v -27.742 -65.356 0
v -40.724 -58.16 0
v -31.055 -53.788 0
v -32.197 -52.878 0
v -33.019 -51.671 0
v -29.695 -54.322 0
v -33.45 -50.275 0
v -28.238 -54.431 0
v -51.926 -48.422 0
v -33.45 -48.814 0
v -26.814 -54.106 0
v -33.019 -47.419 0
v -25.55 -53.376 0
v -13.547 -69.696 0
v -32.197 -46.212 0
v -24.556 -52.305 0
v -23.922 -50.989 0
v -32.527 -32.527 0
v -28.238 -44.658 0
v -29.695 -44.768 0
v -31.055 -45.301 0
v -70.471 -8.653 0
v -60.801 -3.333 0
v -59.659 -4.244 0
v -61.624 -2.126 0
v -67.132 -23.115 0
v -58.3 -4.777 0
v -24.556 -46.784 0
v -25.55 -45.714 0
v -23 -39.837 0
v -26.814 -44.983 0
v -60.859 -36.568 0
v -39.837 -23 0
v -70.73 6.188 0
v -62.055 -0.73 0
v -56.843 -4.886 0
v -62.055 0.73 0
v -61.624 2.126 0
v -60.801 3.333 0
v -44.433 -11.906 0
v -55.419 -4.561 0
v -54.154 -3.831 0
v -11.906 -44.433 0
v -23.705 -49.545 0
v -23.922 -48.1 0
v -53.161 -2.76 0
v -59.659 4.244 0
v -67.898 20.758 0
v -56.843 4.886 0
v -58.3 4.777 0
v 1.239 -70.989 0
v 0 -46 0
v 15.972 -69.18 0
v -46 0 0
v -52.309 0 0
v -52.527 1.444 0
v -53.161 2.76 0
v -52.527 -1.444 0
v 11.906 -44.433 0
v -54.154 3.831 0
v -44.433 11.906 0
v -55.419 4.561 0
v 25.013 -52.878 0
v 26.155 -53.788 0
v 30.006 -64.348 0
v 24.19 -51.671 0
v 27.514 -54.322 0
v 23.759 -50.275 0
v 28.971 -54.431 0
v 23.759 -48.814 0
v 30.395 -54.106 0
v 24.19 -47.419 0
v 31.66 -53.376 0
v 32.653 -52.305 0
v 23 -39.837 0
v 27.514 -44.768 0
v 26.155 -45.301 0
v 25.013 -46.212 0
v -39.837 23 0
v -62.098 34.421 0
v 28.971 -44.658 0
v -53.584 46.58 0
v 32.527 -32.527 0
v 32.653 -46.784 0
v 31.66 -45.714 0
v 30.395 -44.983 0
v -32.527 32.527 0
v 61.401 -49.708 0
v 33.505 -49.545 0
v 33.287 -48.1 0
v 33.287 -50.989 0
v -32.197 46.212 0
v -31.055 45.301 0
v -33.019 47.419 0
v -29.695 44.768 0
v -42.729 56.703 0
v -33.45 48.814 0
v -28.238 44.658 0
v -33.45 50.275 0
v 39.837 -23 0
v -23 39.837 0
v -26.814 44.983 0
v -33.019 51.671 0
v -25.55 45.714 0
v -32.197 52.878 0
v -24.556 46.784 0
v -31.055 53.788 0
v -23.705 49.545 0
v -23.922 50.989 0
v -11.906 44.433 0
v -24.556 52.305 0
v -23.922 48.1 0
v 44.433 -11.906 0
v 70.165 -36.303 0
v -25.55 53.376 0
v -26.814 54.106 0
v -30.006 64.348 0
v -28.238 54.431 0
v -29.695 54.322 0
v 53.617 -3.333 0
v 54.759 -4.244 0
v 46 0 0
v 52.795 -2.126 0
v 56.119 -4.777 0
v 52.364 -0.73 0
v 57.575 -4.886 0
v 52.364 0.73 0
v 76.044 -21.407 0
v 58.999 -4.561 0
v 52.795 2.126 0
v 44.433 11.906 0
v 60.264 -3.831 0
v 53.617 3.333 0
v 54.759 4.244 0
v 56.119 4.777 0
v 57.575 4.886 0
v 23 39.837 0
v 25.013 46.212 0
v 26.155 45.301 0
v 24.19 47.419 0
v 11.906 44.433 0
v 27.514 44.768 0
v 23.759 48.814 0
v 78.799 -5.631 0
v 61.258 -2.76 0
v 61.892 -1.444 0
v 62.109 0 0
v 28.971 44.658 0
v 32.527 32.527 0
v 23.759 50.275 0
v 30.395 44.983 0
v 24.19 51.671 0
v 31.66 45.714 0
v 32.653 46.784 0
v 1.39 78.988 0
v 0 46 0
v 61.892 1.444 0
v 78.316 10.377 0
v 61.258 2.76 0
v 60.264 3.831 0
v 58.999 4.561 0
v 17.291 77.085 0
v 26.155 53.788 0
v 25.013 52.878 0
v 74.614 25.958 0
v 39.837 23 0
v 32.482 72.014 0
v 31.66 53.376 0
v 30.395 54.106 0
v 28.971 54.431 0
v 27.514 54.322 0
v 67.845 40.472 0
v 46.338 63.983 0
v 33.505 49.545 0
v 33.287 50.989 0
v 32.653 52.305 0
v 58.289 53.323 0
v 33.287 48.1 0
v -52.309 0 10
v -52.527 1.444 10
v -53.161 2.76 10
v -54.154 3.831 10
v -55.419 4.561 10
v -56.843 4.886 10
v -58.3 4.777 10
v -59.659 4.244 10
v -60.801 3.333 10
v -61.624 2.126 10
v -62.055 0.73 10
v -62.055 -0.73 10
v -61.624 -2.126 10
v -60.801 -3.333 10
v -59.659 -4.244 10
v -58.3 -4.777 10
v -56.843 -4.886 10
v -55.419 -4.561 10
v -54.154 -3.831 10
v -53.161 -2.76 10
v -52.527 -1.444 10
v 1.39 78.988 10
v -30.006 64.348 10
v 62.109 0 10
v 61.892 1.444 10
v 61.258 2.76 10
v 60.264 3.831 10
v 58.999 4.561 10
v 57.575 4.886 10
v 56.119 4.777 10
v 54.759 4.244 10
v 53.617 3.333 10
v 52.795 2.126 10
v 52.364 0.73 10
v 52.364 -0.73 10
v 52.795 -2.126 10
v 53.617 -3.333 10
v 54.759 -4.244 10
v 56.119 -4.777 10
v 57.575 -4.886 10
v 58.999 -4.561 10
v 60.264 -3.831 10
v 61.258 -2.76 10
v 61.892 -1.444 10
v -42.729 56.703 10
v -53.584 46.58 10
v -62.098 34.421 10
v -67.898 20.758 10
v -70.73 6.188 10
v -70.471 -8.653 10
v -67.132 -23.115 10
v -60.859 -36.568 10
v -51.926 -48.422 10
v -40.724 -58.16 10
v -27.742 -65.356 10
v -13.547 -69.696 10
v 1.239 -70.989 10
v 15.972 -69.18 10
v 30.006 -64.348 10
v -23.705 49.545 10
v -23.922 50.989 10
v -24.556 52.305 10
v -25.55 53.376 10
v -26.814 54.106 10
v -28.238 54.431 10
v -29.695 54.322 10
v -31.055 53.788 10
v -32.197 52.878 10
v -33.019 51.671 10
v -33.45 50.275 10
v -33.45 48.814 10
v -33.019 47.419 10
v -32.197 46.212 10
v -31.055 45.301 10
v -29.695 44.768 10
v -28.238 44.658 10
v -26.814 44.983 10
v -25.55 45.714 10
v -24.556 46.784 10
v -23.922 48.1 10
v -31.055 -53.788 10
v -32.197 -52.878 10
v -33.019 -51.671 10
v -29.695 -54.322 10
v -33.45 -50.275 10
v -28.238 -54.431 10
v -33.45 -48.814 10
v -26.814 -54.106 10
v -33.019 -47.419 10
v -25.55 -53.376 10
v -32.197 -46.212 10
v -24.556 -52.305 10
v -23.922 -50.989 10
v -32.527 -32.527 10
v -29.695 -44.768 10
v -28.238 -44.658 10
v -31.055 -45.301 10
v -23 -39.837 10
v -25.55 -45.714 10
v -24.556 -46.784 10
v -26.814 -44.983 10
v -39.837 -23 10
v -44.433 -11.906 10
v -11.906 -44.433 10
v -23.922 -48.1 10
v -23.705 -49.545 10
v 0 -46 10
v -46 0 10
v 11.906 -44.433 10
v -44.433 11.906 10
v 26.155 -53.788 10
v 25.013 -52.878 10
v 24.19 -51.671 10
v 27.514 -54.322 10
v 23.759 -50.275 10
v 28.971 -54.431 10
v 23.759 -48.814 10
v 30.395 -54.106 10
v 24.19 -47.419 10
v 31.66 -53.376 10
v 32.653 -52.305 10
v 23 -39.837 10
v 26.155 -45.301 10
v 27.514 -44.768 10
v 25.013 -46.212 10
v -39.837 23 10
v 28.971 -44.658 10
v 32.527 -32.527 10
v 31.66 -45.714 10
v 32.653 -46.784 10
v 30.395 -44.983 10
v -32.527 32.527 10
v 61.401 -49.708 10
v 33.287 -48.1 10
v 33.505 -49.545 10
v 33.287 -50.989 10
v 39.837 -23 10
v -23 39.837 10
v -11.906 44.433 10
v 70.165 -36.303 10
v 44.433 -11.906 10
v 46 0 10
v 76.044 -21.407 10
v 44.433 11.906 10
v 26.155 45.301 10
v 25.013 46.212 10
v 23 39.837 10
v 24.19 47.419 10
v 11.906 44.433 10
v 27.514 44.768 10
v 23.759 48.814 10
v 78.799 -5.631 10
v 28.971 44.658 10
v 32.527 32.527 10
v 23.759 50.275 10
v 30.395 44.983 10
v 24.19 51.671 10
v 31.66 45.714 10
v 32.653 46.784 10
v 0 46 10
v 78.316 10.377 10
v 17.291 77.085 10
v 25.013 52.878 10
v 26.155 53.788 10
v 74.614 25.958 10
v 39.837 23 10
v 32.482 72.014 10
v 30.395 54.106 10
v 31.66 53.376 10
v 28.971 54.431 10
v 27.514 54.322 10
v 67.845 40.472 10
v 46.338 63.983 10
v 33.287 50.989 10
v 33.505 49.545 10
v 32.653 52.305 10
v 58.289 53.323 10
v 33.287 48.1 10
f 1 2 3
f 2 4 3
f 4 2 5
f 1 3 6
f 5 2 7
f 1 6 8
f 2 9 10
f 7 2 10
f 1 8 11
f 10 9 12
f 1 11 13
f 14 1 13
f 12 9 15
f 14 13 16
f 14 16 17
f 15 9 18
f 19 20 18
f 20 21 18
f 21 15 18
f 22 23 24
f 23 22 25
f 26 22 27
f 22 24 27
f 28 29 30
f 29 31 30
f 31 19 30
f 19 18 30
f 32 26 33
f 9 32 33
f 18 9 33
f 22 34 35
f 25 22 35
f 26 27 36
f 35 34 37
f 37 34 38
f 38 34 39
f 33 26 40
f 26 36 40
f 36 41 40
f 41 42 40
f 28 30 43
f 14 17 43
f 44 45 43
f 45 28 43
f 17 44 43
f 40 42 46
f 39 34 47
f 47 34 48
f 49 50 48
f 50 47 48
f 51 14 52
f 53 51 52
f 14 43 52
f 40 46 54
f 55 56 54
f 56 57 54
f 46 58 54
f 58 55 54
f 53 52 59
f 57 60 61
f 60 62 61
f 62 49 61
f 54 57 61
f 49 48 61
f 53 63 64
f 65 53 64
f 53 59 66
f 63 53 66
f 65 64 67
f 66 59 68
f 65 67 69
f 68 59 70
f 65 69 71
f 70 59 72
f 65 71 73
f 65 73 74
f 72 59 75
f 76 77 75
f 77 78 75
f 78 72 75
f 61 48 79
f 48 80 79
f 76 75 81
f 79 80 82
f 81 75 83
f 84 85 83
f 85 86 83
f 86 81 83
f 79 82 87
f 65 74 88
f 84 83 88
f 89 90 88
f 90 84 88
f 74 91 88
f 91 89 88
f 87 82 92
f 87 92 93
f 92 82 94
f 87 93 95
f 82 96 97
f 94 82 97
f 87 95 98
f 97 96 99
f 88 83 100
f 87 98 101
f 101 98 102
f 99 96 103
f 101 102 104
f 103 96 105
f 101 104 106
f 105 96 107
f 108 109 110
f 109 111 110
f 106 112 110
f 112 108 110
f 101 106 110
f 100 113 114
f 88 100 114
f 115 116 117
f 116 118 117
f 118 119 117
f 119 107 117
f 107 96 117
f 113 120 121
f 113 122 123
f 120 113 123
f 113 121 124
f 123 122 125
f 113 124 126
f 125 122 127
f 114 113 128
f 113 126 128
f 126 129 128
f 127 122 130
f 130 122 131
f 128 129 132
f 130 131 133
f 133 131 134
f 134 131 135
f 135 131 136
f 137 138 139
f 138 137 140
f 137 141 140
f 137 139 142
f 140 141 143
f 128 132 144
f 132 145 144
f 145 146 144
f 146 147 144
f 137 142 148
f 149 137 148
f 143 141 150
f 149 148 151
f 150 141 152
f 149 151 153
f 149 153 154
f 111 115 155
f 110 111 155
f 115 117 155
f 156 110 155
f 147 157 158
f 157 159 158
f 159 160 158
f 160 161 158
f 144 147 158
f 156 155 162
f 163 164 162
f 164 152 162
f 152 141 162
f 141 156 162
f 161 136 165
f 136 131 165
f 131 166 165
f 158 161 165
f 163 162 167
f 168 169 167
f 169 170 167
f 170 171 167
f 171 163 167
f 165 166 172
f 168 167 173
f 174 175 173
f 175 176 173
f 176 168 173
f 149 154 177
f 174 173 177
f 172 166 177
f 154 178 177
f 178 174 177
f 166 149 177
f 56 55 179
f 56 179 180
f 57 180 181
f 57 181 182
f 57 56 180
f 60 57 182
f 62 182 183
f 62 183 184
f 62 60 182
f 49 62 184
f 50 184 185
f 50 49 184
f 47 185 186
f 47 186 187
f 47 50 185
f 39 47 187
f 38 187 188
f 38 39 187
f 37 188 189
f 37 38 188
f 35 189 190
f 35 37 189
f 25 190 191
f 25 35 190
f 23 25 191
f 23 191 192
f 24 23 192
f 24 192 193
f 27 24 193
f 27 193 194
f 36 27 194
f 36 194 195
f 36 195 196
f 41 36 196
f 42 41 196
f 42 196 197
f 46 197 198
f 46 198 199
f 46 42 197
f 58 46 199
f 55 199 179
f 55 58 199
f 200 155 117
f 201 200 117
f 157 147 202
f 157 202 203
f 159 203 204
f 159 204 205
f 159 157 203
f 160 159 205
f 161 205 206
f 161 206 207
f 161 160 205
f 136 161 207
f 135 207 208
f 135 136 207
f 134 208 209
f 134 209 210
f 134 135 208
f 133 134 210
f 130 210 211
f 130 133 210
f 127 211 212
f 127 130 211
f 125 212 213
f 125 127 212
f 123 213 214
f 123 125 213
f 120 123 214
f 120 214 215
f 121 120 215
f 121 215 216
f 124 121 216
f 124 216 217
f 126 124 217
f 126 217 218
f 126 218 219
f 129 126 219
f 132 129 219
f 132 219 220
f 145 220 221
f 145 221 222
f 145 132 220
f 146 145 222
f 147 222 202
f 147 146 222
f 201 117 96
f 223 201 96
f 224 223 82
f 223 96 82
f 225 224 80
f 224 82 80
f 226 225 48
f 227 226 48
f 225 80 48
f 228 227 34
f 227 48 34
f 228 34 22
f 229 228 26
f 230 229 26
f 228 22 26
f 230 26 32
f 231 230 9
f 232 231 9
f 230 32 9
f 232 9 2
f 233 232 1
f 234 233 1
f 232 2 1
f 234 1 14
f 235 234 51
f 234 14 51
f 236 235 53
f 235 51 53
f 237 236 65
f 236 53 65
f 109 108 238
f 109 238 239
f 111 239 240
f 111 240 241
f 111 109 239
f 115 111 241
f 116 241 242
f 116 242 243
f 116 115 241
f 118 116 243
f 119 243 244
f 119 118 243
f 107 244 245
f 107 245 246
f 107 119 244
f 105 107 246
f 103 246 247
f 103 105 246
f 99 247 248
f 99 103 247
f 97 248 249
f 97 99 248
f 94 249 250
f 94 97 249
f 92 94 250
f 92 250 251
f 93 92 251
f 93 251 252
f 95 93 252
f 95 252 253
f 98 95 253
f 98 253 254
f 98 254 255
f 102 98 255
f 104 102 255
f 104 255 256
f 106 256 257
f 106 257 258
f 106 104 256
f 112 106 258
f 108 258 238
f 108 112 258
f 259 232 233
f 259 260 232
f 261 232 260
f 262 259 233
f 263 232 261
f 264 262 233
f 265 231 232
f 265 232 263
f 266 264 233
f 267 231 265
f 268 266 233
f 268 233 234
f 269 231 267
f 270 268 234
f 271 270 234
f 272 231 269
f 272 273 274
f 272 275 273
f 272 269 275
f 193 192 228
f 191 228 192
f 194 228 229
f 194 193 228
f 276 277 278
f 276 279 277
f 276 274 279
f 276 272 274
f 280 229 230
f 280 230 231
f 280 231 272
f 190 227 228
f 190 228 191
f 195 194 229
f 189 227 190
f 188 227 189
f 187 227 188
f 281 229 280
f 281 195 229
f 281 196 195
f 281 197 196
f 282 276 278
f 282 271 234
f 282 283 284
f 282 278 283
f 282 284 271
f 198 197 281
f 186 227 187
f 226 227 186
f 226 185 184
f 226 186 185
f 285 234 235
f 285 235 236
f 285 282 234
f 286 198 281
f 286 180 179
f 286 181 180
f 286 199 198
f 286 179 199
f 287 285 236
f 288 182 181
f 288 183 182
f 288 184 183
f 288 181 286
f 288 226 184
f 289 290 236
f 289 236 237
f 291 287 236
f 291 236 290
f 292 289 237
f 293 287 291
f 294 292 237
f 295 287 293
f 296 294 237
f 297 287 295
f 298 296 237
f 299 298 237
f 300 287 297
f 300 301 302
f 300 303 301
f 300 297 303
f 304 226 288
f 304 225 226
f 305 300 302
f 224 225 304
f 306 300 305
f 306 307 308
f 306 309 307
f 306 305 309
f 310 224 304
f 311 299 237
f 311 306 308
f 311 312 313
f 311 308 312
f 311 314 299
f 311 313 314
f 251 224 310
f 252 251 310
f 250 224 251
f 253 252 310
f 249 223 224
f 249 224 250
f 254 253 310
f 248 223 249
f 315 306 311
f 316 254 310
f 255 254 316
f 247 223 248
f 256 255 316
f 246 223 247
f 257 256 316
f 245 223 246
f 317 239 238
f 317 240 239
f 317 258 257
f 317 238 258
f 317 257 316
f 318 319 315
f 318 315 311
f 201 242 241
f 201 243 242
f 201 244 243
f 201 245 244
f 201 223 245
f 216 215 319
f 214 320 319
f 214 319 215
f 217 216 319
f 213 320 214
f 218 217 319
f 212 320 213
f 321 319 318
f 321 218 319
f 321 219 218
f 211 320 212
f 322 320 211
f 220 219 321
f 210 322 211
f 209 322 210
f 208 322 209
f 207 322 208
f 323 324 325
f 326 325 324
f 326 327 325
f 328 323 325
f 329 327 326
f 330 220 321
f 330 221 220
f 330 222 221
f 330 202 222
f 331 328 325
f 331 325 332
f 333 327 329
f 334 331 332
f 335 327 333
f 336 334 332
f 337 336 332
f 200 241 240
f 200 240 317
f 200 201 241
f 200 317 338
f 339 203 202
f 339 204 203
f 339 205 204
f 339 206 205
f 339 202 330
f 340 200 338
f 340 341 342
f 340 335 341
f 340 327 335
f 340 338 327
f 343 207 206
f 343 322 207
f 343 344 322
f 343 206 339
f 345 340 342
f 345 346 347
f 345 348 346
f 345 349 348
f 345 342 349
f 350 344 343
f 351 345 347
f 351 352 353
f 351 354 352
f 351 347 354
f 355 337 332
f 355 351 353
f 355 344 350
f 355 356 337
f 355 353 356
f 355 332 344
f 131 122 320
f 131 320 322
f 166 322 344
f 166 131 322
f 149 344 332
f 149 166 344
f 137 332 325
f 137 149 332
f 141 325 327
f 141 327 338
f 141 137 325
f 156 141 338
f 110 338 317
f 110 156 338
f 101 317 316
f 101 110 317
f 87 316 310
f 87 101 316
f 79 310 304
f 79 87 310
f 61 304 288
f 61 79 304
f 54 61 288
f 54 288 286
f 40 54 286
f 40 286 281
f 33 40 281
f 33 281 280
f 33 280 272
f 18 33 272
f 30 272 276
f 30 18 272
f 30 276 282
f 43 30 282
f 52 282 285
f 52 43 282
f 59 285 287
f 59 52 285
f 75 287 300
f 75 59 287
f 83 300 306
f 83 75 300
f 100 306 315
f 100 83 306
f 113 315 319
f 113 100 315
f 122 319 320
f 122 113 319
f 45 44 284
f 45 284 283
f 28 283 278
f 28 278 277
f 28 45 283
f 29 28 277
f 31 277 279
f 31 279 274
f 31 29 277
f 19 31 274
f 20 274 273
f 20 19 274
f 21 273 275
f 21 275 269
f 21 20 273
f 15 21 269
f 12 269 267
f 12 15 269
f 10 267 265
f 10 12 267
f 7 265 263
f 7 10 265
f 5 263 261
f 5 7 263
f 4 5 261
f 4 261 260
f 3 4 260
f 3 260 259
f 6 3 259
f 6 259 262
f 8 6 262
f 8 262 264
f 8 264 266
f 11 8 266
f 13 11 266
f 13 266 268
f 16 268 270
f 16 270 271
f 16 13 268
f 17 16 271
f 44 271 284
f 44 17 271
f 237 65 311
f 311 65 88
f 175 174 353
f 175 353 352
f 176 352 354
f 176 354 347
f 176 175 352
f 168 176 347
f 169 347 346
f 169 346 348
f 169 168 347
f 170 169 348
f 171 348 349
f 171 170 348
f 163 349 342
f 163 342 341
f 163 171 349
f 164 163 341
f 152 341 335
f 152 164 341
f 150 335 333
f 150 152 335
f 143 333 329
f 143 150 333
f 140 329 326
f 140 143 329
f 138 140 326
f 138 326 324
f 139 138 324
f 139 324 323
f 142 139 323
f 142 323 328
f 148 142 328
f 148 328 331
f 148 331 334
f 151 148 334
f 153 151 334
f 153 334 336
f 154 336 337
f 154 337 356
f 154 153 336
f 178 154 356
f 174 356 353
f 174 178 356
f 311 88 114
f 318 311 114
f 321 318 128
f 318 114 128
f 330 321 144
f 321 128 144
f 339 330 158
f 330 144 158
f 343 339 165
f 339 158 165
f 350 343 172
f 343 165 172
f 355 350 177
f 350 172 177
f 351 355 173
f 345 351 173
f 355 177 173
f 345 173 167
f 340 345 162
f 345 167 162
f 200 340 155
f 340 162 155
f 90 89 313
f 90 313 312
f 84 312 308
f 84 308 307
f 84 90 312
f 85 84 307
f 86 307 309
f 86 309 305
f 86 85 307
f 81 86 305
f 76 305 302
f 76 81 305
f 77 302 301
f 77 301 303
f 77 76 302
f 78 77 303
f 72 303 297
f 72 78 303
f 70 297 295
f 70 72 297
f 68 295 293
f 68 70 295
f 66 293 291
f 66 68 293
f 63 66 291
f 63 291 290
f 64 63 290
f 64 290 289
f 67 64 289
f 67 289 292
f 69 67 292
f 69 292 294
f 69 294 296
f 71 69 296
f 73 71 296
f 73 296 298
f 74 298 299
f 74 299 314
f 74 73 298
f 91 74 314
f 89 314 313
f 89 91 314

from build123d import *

# Parameters (mm, degrees)
F0_R     = 4.9
F0_R_2   = 46
F1_DEPTH = 10


with BuildPart() as f1:
    # F0 (on Top) → F1 (new body)
    with BuildSketch(Plane.XY):
        with BuildLine():
            Line((1.389526, 78.987779), (-30.005897, 64.347853))
            ThreePointArc((-30.005897, 64.347853), (-64.347853, -30.005897), (30.005897, -64.347853))
            Line((30.005897, -64.347853), (61.401319, -49.707927))
            ThreePointArc((61.401319, -49.707927), (71.598315, 33.386843), (1.389526, 78.987779))
        make_face()
        with Locations((-28.60465, -49.544707)):
            Circle(F0_R, mode=Mode.SUBTRACT)
        with Locations((-57.2093, 0)):
            Circle(F0_R, mode=Mode.SUBTRACT)
        Circle(F0_R_2, mode=Mode.SUBTRACT)
        with Locations((28.60465, -49.544707)):
            Circle(F0_R, mode=Mode.SUBTRACT)
        with Locations((57.2093, 0)):
            Circle(F0_R, mode=Mode.SUBTRACT)
        with Locations((-28.60465, 49.544707)):
            Circle(F0_R, mode=Mode.SUBTRACT)
        with Locations((28.60465, 49.544707)):
            Circle(F0_R, mode=Mode.SUBTRACT)
    extrude(amount=F1_DEPTH)


solid = f1.part
